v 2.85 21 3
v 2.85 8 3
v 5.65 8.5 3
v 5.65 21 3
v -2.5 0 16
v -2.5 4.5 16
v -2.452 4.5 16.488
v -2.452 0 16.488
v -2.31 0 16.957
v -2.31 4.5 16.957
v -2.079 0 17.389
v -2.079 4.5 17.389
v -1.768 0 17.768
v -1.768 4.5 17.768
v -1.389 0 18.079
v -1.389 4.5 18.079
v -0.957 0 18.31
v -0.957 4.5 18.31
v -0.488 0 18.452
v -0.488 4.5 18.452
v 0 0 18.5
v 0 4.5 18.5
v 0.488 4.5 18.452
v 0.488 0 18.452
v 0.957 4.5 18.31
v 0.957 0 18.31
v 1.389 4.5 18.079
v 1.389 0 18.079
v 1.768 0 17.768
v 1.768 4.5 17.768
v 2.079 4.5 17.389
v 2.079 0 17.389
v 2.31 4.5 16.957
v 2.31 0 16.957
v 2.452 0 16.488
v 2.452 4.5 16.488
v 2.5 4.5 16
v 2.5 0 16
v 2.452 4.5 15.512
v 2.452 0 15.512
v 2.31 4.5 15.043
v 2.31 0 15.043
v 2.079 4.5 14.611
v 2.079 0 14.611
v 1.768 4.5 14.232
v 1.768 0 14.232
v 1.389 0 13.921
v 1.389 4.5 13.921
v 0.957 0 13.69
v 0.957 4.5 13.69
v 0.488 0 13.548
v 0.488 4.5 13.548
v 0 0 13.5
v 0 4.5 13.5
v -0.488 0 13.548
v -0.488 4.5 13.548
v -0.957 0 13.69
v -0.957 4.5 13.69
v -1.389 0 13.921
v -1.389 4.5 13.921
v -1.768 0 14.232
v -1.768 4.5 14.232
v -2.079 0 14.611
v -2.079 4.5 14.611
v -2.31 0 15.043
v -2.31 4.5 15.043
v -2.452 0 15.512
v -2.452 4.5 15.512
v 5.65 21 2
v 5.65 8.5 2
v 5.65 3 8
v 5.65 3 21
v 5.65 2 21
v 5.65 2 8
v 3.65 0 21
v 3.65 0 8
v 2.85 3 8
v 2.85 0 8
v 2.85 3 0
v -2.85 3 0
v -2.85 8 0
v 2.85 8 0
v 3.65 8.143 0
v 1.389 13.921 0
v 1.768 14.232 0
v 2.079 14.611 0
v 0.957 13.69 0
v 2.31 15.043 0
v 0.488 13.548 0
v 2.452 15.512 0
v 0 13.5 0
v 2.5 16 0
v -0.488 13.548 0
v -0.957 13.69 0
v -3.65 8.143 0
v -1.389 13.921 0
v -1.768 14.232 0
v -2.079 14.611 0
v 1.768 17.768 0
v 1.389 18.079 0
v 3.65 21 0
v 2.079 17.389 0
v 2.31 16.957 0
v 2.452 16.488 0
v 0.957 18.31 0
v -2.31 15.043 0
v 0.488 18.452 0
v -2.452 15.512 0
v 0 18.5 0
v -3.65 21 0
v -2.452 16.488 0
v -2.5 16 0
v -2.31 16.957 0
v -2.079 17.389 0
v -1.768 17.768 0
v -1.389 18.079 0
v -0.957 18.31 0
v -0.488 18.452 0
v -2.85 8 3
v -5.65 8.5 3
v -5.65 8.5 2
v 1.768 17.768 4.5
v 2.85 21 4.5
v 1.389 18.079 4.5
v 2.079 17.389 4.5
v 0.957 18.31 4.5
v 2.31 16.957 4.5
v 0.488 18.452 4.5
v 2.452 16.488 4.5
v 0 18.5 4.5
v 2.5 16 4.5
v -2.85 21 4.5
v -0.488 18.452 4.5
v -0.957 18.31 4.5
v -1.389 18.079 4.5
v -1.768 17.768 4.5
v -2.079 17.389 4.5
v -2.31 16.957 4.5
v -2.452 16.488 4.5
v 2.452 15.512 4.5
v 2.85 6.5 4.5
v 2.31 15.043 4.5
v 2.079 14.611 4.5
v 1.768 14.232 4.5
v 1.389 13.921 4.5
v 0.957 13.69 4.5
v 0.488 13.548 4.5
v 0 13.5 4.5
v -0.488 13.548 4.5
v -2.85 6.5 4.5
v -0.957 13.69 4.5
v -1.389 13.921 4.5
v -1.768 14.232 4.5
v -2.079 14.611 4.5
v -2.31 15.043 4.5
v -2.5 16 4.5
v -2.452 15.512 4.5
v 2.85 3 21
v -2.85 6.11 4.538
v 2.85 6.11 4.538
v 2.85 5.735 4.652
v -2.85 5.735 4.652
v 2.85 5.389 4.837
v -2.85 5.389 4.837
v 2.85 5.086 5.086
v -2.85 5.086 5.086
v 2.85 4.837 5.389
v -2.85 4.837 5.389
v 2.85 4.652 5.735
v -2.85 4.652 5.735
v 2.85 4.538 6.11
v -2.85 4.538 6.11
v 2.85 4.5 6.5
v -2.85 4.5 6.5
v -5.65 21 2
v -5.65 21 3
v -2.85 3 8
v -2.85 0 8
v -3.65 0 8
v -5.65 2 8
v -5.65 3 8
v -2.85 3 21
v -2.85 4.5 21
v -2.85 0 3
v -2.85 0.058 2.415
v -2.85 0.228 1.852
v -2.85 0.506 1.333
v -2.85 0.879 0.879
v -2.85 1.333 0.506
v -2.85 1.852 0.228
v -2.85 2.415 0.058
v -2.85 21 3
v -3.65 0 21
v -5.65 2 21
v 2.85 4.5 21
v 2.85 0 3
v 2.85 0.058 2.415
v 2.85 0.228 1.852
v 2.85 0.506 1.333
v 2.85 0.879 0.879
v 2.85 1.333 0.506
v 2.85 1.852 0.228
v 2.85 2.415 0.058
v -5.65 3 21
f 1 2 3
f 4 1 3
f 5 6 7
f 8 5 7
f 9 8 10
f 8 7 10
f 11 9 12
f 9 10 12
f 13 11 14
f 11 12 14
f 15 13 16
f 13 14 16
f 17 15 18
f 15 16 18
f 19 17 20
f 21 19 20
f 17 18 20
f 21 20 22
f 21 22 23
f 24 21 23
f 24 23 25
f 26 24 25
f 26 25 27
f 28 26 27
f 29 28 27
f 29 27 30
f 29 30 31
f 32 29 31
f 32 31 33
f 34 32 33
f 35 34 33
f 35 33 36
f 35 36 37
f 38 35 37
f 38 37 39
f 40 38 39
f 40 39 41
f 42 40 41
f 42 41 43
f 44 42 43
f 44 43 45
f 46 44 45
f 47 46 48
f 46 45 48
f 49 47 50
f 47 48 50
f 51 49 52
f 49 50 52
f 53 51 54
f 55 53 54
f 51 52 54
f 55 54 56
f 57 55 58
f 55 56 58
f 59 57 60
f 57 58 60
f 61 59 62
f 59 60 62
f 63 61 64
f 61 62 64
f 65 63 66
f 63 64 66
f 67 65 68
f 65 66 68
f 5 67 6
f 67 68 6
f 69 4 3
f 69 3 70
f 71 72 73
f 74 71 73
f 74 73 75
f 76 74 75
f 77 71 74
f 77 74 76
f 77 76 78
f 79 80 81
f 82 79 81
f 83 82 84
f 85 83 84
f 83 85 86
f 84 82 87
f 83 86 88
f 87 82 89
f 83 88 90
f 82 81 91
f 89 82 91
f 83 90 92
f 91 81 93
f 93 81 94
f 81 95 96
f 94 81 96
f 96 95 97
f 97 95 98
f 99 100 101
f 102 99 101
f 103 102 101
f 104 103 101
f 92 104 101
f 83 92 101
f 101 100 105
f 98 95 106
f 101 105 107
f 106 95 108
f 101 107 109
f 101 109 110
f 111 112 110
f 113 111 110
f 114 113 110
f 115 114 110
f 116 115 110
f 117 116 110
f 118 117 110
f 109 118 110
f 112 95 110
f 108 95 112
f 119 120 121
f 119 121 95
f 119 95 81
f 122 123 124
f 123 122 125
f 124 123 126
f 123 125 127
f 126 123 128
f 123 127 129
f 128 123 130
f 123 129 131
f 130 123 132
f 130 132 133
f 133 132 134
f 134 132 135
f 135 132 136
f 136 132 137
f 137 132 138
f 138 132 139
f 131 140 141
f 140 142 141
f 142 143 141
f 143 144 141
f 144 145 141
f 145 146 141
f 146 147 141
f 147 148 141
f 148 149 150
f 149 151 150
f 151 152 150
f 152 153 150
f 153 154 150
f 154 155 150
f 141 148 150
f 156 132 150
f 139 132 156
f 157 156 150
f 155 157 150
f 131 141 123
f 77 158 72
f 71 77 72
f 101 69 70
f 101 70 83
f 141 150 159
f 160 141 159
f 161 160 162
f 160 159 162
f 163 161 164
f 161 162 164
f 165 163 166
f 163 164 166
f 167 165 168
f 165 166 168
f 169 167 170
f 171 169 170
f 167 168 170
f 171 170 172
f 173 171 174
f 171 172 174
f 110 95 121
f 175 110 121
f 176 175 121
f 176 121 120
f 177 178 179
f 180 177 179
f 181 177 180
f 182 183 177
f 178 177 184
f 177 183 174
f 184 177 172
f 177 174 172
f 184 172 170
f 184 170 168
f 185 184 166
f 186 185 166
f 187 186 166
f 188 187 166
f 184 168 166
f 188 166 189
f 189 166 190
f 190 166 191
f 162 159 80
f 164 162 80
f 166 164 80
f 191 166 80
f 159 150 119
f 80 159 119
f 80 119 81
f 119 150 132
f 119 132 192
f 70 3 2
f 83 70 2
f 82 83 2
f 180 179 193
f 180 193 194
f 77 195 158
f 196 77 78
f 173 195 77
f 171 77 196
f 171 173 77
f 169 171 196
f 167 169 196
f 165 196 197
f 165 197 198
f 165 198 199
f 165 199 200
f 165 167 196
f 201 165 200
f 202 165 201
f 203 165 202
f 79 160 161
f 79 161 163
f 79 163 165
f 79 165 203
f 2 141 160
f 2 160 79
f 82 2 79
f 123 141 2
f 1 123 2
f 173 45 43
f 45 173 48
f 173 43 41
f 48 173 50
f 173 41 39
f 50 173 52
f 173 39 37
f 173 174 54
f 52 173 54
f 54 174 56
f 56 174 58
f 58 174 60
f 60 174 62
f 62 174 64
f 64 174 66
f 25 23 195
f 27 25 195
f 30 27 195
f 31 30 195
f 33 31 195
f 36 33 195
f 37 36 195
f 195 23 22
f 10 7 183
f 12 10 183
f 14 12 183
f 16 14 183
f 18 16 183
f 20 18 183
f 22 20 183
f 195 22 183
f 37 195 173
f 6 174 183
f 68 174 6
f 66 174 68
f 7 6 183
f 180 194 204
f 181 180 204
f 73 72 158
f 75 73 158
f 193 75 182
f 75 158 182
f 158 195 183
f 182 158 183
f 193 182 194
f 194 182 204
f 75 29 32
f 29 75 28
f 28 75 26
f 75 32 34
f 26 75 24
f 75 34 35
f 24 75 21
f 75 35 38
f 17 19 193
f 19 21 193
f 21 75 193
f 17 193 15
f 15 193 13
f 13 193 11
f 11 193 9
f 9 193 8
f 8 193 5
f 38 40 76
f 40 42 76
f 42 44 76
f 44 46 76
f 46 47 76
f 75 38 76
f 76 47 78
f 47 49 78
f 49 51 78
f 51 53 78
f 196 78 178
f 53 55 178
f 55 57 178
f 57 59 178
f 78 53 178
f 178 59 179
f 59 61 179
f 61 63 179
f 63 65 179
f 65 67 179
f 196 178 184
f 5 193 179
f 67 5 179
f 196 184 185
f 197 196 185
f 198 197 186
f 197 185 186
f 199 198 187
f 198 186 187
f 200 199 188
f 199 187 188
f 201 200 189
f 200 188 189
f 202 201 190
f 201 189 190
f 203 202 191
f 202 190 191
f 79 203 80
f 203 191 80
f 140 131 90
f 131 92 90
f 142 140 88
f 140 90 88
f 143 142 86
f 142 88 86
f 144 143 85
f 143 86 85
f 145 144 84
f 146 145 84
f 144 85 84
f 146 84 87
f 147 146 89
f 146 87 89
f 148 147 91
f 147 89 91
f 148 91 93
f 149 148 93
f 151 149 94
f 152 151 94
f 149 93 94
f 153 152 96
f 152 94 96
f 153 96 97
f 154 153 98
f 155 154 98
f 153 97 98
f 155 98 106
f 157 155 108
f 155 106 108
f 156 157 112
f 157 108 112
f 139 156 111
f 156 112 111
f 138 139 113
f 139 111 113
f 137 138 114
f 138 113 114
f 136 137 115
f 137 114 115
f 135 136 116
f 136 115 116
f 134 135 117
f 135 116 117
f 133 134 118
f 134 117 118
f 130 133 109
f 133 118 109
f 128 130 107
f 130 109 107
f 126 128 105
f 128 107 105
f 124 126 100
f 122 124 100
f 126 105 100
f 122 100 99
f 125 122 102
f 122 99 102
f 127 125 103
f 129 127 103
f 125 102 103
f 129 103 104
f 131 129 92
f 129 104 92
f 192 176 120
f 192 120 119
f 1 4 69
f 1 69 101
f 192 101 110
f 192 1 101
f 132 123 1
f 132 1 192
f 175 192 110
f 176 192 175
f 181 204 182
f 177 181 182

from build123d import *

# Parameters (mm, degrees)
BOSS_EXTRUDE1_DEPTH      = 13
SKETCH2_R                = 2.5
CUT_EXTRUDE1_DEPTH       = 23.207487476
BOSS_EXTRUDE2_DEPTH      = 13
CUT_EXTRUDE2_DEPTH       = 28.297847901
BOSS_EXTRUDE3_DEPTH      = 2.85
BOSS_EXTRUDE3_DEPTH_BACK = 2.85
SKETCH5_W                = 4.5
SKETCH5_H                = 2.5


with BuildPart() as part:
    # Sketch1 → Boss-Extrude1 (new body)
    with BuildSketch(Plane.XY.offset(21)):
        Polygon((-2.85, 4.5), (2.85, 4.5), (2.85, 3), (5.65, 3), (5.65, 2), (3.65, 0), (-3.65, 0), (-5.65, 2), (-5.65, 3), (-2.85, 3), align=None)
    extrude(amount=-BOSS_EXTRUDE1_DEPTH)

    # Sketch2 → Cut-Extrude1 (cut, through all)
    with BuildSketch(Plane(origin=(0, 4.5, 0), x_dir=(1, 0, 0), z_dir=(0, 1, 0))):
        with Locations(Location((0, -16, 0), (0, 0, 180))):
            Circle(SKETCH2_R)
    extrude(amount=-CUT_EXTRUDE1_DEPTH, mode=Mode.SUBTRACT)



with BuildPart() as body_2:
    # Sketch3 → Boss-Extrude2 (new body)
    with BuildSketch(Plane(origin=(0, 21, 0), x_dir=(-1, 0, 0), z_dir=(0, 1, 0))):
        Polygon((2.85, 4.5), (-2.85, 4.5), (-2.85, 3), (-5.65, 3), (-5.65, 2), (-3.65, 0), (3.65, 0), (5.65, 2), (5.65, 3), (2.85, 3), align=None)
    extrude(amount=-BOSS_EXTRUDE2_DEPTH)

    # Sketch6 → Cut-Extrude2 (cut, through all)
    with BuildSketch(Plane.XY.offset(4.5)):
        Polygon((-5.65, 8), (-5.65, 8.5), (-2.85, 8), align=None)
        Polygon((2.85, 8), (5.65, 8), (5.65, 8.5), align=None)
    extrude(amount=-CUT_EXTRUDE2_DEPTH, mode=Mode.SUBTRACT)


with BuildPart() as part_1:
    add(part.part)

    add(body_2.part)  # Boss-Extrude3 merges body 2
    # Sketch7 → Boss-Extrude3 (add, two sides: drawn at the far end of the back side and taken through both)
    with BuildSketch(Plane(origin=(0, 0, 0), x_dir=(0, 0, -1), z_dir=(1, 0, 0)).offset(-BOSS_EXTRUDE3_DEPTH_BACK)):
        with BuildLine():
            Line((-8, 0), (-3, 0))
            ThreePointArc((-3, 0), (-0.878679656, 0.878679656), (0, 3))
            Line((0, 3), (0, 8))
            Line((0, 8), (-4.5, 8))
            Line((-4.5, 8), (-4.5, 6.5))
            ThreePointArc((-4.5, 6.5), (-5.085786438, 5.085786438), (-6.5, 4.5))
            Line((-6.5, 4.5), (-8, 4.5))
            Line((-8, 4.5), (-8, 0))
        make_face()
    extrude(amount=BOSS_EXTRUDE3_DEPTH + BOSS_EXTRUDE3_DEPTH_BACK)

    # Sketch5 → Cut-Revolve1 (revolve, cut)
    with BuildSketch(Plane(origin=(0, 0, 0), x_dir=(0, 0, -1), z_dir=(1, 0, 0)), mode=Mode.PRIVATE) as cut_revolve1_sk:
        with Locations((-2.25, 17.25)):
            Rectangle(SKETCH5_W, SKETCH5_H)
    revolve(cut_revolve1_sk.sketch.rotate(Axis((0, 16, 6.063446942), (0, 0, -1)), 90), axis=Axis((0, 16, 6.063446942), (0, 0, -1)), mode=Mode.SUBTRACT)


solid = part_1.part
